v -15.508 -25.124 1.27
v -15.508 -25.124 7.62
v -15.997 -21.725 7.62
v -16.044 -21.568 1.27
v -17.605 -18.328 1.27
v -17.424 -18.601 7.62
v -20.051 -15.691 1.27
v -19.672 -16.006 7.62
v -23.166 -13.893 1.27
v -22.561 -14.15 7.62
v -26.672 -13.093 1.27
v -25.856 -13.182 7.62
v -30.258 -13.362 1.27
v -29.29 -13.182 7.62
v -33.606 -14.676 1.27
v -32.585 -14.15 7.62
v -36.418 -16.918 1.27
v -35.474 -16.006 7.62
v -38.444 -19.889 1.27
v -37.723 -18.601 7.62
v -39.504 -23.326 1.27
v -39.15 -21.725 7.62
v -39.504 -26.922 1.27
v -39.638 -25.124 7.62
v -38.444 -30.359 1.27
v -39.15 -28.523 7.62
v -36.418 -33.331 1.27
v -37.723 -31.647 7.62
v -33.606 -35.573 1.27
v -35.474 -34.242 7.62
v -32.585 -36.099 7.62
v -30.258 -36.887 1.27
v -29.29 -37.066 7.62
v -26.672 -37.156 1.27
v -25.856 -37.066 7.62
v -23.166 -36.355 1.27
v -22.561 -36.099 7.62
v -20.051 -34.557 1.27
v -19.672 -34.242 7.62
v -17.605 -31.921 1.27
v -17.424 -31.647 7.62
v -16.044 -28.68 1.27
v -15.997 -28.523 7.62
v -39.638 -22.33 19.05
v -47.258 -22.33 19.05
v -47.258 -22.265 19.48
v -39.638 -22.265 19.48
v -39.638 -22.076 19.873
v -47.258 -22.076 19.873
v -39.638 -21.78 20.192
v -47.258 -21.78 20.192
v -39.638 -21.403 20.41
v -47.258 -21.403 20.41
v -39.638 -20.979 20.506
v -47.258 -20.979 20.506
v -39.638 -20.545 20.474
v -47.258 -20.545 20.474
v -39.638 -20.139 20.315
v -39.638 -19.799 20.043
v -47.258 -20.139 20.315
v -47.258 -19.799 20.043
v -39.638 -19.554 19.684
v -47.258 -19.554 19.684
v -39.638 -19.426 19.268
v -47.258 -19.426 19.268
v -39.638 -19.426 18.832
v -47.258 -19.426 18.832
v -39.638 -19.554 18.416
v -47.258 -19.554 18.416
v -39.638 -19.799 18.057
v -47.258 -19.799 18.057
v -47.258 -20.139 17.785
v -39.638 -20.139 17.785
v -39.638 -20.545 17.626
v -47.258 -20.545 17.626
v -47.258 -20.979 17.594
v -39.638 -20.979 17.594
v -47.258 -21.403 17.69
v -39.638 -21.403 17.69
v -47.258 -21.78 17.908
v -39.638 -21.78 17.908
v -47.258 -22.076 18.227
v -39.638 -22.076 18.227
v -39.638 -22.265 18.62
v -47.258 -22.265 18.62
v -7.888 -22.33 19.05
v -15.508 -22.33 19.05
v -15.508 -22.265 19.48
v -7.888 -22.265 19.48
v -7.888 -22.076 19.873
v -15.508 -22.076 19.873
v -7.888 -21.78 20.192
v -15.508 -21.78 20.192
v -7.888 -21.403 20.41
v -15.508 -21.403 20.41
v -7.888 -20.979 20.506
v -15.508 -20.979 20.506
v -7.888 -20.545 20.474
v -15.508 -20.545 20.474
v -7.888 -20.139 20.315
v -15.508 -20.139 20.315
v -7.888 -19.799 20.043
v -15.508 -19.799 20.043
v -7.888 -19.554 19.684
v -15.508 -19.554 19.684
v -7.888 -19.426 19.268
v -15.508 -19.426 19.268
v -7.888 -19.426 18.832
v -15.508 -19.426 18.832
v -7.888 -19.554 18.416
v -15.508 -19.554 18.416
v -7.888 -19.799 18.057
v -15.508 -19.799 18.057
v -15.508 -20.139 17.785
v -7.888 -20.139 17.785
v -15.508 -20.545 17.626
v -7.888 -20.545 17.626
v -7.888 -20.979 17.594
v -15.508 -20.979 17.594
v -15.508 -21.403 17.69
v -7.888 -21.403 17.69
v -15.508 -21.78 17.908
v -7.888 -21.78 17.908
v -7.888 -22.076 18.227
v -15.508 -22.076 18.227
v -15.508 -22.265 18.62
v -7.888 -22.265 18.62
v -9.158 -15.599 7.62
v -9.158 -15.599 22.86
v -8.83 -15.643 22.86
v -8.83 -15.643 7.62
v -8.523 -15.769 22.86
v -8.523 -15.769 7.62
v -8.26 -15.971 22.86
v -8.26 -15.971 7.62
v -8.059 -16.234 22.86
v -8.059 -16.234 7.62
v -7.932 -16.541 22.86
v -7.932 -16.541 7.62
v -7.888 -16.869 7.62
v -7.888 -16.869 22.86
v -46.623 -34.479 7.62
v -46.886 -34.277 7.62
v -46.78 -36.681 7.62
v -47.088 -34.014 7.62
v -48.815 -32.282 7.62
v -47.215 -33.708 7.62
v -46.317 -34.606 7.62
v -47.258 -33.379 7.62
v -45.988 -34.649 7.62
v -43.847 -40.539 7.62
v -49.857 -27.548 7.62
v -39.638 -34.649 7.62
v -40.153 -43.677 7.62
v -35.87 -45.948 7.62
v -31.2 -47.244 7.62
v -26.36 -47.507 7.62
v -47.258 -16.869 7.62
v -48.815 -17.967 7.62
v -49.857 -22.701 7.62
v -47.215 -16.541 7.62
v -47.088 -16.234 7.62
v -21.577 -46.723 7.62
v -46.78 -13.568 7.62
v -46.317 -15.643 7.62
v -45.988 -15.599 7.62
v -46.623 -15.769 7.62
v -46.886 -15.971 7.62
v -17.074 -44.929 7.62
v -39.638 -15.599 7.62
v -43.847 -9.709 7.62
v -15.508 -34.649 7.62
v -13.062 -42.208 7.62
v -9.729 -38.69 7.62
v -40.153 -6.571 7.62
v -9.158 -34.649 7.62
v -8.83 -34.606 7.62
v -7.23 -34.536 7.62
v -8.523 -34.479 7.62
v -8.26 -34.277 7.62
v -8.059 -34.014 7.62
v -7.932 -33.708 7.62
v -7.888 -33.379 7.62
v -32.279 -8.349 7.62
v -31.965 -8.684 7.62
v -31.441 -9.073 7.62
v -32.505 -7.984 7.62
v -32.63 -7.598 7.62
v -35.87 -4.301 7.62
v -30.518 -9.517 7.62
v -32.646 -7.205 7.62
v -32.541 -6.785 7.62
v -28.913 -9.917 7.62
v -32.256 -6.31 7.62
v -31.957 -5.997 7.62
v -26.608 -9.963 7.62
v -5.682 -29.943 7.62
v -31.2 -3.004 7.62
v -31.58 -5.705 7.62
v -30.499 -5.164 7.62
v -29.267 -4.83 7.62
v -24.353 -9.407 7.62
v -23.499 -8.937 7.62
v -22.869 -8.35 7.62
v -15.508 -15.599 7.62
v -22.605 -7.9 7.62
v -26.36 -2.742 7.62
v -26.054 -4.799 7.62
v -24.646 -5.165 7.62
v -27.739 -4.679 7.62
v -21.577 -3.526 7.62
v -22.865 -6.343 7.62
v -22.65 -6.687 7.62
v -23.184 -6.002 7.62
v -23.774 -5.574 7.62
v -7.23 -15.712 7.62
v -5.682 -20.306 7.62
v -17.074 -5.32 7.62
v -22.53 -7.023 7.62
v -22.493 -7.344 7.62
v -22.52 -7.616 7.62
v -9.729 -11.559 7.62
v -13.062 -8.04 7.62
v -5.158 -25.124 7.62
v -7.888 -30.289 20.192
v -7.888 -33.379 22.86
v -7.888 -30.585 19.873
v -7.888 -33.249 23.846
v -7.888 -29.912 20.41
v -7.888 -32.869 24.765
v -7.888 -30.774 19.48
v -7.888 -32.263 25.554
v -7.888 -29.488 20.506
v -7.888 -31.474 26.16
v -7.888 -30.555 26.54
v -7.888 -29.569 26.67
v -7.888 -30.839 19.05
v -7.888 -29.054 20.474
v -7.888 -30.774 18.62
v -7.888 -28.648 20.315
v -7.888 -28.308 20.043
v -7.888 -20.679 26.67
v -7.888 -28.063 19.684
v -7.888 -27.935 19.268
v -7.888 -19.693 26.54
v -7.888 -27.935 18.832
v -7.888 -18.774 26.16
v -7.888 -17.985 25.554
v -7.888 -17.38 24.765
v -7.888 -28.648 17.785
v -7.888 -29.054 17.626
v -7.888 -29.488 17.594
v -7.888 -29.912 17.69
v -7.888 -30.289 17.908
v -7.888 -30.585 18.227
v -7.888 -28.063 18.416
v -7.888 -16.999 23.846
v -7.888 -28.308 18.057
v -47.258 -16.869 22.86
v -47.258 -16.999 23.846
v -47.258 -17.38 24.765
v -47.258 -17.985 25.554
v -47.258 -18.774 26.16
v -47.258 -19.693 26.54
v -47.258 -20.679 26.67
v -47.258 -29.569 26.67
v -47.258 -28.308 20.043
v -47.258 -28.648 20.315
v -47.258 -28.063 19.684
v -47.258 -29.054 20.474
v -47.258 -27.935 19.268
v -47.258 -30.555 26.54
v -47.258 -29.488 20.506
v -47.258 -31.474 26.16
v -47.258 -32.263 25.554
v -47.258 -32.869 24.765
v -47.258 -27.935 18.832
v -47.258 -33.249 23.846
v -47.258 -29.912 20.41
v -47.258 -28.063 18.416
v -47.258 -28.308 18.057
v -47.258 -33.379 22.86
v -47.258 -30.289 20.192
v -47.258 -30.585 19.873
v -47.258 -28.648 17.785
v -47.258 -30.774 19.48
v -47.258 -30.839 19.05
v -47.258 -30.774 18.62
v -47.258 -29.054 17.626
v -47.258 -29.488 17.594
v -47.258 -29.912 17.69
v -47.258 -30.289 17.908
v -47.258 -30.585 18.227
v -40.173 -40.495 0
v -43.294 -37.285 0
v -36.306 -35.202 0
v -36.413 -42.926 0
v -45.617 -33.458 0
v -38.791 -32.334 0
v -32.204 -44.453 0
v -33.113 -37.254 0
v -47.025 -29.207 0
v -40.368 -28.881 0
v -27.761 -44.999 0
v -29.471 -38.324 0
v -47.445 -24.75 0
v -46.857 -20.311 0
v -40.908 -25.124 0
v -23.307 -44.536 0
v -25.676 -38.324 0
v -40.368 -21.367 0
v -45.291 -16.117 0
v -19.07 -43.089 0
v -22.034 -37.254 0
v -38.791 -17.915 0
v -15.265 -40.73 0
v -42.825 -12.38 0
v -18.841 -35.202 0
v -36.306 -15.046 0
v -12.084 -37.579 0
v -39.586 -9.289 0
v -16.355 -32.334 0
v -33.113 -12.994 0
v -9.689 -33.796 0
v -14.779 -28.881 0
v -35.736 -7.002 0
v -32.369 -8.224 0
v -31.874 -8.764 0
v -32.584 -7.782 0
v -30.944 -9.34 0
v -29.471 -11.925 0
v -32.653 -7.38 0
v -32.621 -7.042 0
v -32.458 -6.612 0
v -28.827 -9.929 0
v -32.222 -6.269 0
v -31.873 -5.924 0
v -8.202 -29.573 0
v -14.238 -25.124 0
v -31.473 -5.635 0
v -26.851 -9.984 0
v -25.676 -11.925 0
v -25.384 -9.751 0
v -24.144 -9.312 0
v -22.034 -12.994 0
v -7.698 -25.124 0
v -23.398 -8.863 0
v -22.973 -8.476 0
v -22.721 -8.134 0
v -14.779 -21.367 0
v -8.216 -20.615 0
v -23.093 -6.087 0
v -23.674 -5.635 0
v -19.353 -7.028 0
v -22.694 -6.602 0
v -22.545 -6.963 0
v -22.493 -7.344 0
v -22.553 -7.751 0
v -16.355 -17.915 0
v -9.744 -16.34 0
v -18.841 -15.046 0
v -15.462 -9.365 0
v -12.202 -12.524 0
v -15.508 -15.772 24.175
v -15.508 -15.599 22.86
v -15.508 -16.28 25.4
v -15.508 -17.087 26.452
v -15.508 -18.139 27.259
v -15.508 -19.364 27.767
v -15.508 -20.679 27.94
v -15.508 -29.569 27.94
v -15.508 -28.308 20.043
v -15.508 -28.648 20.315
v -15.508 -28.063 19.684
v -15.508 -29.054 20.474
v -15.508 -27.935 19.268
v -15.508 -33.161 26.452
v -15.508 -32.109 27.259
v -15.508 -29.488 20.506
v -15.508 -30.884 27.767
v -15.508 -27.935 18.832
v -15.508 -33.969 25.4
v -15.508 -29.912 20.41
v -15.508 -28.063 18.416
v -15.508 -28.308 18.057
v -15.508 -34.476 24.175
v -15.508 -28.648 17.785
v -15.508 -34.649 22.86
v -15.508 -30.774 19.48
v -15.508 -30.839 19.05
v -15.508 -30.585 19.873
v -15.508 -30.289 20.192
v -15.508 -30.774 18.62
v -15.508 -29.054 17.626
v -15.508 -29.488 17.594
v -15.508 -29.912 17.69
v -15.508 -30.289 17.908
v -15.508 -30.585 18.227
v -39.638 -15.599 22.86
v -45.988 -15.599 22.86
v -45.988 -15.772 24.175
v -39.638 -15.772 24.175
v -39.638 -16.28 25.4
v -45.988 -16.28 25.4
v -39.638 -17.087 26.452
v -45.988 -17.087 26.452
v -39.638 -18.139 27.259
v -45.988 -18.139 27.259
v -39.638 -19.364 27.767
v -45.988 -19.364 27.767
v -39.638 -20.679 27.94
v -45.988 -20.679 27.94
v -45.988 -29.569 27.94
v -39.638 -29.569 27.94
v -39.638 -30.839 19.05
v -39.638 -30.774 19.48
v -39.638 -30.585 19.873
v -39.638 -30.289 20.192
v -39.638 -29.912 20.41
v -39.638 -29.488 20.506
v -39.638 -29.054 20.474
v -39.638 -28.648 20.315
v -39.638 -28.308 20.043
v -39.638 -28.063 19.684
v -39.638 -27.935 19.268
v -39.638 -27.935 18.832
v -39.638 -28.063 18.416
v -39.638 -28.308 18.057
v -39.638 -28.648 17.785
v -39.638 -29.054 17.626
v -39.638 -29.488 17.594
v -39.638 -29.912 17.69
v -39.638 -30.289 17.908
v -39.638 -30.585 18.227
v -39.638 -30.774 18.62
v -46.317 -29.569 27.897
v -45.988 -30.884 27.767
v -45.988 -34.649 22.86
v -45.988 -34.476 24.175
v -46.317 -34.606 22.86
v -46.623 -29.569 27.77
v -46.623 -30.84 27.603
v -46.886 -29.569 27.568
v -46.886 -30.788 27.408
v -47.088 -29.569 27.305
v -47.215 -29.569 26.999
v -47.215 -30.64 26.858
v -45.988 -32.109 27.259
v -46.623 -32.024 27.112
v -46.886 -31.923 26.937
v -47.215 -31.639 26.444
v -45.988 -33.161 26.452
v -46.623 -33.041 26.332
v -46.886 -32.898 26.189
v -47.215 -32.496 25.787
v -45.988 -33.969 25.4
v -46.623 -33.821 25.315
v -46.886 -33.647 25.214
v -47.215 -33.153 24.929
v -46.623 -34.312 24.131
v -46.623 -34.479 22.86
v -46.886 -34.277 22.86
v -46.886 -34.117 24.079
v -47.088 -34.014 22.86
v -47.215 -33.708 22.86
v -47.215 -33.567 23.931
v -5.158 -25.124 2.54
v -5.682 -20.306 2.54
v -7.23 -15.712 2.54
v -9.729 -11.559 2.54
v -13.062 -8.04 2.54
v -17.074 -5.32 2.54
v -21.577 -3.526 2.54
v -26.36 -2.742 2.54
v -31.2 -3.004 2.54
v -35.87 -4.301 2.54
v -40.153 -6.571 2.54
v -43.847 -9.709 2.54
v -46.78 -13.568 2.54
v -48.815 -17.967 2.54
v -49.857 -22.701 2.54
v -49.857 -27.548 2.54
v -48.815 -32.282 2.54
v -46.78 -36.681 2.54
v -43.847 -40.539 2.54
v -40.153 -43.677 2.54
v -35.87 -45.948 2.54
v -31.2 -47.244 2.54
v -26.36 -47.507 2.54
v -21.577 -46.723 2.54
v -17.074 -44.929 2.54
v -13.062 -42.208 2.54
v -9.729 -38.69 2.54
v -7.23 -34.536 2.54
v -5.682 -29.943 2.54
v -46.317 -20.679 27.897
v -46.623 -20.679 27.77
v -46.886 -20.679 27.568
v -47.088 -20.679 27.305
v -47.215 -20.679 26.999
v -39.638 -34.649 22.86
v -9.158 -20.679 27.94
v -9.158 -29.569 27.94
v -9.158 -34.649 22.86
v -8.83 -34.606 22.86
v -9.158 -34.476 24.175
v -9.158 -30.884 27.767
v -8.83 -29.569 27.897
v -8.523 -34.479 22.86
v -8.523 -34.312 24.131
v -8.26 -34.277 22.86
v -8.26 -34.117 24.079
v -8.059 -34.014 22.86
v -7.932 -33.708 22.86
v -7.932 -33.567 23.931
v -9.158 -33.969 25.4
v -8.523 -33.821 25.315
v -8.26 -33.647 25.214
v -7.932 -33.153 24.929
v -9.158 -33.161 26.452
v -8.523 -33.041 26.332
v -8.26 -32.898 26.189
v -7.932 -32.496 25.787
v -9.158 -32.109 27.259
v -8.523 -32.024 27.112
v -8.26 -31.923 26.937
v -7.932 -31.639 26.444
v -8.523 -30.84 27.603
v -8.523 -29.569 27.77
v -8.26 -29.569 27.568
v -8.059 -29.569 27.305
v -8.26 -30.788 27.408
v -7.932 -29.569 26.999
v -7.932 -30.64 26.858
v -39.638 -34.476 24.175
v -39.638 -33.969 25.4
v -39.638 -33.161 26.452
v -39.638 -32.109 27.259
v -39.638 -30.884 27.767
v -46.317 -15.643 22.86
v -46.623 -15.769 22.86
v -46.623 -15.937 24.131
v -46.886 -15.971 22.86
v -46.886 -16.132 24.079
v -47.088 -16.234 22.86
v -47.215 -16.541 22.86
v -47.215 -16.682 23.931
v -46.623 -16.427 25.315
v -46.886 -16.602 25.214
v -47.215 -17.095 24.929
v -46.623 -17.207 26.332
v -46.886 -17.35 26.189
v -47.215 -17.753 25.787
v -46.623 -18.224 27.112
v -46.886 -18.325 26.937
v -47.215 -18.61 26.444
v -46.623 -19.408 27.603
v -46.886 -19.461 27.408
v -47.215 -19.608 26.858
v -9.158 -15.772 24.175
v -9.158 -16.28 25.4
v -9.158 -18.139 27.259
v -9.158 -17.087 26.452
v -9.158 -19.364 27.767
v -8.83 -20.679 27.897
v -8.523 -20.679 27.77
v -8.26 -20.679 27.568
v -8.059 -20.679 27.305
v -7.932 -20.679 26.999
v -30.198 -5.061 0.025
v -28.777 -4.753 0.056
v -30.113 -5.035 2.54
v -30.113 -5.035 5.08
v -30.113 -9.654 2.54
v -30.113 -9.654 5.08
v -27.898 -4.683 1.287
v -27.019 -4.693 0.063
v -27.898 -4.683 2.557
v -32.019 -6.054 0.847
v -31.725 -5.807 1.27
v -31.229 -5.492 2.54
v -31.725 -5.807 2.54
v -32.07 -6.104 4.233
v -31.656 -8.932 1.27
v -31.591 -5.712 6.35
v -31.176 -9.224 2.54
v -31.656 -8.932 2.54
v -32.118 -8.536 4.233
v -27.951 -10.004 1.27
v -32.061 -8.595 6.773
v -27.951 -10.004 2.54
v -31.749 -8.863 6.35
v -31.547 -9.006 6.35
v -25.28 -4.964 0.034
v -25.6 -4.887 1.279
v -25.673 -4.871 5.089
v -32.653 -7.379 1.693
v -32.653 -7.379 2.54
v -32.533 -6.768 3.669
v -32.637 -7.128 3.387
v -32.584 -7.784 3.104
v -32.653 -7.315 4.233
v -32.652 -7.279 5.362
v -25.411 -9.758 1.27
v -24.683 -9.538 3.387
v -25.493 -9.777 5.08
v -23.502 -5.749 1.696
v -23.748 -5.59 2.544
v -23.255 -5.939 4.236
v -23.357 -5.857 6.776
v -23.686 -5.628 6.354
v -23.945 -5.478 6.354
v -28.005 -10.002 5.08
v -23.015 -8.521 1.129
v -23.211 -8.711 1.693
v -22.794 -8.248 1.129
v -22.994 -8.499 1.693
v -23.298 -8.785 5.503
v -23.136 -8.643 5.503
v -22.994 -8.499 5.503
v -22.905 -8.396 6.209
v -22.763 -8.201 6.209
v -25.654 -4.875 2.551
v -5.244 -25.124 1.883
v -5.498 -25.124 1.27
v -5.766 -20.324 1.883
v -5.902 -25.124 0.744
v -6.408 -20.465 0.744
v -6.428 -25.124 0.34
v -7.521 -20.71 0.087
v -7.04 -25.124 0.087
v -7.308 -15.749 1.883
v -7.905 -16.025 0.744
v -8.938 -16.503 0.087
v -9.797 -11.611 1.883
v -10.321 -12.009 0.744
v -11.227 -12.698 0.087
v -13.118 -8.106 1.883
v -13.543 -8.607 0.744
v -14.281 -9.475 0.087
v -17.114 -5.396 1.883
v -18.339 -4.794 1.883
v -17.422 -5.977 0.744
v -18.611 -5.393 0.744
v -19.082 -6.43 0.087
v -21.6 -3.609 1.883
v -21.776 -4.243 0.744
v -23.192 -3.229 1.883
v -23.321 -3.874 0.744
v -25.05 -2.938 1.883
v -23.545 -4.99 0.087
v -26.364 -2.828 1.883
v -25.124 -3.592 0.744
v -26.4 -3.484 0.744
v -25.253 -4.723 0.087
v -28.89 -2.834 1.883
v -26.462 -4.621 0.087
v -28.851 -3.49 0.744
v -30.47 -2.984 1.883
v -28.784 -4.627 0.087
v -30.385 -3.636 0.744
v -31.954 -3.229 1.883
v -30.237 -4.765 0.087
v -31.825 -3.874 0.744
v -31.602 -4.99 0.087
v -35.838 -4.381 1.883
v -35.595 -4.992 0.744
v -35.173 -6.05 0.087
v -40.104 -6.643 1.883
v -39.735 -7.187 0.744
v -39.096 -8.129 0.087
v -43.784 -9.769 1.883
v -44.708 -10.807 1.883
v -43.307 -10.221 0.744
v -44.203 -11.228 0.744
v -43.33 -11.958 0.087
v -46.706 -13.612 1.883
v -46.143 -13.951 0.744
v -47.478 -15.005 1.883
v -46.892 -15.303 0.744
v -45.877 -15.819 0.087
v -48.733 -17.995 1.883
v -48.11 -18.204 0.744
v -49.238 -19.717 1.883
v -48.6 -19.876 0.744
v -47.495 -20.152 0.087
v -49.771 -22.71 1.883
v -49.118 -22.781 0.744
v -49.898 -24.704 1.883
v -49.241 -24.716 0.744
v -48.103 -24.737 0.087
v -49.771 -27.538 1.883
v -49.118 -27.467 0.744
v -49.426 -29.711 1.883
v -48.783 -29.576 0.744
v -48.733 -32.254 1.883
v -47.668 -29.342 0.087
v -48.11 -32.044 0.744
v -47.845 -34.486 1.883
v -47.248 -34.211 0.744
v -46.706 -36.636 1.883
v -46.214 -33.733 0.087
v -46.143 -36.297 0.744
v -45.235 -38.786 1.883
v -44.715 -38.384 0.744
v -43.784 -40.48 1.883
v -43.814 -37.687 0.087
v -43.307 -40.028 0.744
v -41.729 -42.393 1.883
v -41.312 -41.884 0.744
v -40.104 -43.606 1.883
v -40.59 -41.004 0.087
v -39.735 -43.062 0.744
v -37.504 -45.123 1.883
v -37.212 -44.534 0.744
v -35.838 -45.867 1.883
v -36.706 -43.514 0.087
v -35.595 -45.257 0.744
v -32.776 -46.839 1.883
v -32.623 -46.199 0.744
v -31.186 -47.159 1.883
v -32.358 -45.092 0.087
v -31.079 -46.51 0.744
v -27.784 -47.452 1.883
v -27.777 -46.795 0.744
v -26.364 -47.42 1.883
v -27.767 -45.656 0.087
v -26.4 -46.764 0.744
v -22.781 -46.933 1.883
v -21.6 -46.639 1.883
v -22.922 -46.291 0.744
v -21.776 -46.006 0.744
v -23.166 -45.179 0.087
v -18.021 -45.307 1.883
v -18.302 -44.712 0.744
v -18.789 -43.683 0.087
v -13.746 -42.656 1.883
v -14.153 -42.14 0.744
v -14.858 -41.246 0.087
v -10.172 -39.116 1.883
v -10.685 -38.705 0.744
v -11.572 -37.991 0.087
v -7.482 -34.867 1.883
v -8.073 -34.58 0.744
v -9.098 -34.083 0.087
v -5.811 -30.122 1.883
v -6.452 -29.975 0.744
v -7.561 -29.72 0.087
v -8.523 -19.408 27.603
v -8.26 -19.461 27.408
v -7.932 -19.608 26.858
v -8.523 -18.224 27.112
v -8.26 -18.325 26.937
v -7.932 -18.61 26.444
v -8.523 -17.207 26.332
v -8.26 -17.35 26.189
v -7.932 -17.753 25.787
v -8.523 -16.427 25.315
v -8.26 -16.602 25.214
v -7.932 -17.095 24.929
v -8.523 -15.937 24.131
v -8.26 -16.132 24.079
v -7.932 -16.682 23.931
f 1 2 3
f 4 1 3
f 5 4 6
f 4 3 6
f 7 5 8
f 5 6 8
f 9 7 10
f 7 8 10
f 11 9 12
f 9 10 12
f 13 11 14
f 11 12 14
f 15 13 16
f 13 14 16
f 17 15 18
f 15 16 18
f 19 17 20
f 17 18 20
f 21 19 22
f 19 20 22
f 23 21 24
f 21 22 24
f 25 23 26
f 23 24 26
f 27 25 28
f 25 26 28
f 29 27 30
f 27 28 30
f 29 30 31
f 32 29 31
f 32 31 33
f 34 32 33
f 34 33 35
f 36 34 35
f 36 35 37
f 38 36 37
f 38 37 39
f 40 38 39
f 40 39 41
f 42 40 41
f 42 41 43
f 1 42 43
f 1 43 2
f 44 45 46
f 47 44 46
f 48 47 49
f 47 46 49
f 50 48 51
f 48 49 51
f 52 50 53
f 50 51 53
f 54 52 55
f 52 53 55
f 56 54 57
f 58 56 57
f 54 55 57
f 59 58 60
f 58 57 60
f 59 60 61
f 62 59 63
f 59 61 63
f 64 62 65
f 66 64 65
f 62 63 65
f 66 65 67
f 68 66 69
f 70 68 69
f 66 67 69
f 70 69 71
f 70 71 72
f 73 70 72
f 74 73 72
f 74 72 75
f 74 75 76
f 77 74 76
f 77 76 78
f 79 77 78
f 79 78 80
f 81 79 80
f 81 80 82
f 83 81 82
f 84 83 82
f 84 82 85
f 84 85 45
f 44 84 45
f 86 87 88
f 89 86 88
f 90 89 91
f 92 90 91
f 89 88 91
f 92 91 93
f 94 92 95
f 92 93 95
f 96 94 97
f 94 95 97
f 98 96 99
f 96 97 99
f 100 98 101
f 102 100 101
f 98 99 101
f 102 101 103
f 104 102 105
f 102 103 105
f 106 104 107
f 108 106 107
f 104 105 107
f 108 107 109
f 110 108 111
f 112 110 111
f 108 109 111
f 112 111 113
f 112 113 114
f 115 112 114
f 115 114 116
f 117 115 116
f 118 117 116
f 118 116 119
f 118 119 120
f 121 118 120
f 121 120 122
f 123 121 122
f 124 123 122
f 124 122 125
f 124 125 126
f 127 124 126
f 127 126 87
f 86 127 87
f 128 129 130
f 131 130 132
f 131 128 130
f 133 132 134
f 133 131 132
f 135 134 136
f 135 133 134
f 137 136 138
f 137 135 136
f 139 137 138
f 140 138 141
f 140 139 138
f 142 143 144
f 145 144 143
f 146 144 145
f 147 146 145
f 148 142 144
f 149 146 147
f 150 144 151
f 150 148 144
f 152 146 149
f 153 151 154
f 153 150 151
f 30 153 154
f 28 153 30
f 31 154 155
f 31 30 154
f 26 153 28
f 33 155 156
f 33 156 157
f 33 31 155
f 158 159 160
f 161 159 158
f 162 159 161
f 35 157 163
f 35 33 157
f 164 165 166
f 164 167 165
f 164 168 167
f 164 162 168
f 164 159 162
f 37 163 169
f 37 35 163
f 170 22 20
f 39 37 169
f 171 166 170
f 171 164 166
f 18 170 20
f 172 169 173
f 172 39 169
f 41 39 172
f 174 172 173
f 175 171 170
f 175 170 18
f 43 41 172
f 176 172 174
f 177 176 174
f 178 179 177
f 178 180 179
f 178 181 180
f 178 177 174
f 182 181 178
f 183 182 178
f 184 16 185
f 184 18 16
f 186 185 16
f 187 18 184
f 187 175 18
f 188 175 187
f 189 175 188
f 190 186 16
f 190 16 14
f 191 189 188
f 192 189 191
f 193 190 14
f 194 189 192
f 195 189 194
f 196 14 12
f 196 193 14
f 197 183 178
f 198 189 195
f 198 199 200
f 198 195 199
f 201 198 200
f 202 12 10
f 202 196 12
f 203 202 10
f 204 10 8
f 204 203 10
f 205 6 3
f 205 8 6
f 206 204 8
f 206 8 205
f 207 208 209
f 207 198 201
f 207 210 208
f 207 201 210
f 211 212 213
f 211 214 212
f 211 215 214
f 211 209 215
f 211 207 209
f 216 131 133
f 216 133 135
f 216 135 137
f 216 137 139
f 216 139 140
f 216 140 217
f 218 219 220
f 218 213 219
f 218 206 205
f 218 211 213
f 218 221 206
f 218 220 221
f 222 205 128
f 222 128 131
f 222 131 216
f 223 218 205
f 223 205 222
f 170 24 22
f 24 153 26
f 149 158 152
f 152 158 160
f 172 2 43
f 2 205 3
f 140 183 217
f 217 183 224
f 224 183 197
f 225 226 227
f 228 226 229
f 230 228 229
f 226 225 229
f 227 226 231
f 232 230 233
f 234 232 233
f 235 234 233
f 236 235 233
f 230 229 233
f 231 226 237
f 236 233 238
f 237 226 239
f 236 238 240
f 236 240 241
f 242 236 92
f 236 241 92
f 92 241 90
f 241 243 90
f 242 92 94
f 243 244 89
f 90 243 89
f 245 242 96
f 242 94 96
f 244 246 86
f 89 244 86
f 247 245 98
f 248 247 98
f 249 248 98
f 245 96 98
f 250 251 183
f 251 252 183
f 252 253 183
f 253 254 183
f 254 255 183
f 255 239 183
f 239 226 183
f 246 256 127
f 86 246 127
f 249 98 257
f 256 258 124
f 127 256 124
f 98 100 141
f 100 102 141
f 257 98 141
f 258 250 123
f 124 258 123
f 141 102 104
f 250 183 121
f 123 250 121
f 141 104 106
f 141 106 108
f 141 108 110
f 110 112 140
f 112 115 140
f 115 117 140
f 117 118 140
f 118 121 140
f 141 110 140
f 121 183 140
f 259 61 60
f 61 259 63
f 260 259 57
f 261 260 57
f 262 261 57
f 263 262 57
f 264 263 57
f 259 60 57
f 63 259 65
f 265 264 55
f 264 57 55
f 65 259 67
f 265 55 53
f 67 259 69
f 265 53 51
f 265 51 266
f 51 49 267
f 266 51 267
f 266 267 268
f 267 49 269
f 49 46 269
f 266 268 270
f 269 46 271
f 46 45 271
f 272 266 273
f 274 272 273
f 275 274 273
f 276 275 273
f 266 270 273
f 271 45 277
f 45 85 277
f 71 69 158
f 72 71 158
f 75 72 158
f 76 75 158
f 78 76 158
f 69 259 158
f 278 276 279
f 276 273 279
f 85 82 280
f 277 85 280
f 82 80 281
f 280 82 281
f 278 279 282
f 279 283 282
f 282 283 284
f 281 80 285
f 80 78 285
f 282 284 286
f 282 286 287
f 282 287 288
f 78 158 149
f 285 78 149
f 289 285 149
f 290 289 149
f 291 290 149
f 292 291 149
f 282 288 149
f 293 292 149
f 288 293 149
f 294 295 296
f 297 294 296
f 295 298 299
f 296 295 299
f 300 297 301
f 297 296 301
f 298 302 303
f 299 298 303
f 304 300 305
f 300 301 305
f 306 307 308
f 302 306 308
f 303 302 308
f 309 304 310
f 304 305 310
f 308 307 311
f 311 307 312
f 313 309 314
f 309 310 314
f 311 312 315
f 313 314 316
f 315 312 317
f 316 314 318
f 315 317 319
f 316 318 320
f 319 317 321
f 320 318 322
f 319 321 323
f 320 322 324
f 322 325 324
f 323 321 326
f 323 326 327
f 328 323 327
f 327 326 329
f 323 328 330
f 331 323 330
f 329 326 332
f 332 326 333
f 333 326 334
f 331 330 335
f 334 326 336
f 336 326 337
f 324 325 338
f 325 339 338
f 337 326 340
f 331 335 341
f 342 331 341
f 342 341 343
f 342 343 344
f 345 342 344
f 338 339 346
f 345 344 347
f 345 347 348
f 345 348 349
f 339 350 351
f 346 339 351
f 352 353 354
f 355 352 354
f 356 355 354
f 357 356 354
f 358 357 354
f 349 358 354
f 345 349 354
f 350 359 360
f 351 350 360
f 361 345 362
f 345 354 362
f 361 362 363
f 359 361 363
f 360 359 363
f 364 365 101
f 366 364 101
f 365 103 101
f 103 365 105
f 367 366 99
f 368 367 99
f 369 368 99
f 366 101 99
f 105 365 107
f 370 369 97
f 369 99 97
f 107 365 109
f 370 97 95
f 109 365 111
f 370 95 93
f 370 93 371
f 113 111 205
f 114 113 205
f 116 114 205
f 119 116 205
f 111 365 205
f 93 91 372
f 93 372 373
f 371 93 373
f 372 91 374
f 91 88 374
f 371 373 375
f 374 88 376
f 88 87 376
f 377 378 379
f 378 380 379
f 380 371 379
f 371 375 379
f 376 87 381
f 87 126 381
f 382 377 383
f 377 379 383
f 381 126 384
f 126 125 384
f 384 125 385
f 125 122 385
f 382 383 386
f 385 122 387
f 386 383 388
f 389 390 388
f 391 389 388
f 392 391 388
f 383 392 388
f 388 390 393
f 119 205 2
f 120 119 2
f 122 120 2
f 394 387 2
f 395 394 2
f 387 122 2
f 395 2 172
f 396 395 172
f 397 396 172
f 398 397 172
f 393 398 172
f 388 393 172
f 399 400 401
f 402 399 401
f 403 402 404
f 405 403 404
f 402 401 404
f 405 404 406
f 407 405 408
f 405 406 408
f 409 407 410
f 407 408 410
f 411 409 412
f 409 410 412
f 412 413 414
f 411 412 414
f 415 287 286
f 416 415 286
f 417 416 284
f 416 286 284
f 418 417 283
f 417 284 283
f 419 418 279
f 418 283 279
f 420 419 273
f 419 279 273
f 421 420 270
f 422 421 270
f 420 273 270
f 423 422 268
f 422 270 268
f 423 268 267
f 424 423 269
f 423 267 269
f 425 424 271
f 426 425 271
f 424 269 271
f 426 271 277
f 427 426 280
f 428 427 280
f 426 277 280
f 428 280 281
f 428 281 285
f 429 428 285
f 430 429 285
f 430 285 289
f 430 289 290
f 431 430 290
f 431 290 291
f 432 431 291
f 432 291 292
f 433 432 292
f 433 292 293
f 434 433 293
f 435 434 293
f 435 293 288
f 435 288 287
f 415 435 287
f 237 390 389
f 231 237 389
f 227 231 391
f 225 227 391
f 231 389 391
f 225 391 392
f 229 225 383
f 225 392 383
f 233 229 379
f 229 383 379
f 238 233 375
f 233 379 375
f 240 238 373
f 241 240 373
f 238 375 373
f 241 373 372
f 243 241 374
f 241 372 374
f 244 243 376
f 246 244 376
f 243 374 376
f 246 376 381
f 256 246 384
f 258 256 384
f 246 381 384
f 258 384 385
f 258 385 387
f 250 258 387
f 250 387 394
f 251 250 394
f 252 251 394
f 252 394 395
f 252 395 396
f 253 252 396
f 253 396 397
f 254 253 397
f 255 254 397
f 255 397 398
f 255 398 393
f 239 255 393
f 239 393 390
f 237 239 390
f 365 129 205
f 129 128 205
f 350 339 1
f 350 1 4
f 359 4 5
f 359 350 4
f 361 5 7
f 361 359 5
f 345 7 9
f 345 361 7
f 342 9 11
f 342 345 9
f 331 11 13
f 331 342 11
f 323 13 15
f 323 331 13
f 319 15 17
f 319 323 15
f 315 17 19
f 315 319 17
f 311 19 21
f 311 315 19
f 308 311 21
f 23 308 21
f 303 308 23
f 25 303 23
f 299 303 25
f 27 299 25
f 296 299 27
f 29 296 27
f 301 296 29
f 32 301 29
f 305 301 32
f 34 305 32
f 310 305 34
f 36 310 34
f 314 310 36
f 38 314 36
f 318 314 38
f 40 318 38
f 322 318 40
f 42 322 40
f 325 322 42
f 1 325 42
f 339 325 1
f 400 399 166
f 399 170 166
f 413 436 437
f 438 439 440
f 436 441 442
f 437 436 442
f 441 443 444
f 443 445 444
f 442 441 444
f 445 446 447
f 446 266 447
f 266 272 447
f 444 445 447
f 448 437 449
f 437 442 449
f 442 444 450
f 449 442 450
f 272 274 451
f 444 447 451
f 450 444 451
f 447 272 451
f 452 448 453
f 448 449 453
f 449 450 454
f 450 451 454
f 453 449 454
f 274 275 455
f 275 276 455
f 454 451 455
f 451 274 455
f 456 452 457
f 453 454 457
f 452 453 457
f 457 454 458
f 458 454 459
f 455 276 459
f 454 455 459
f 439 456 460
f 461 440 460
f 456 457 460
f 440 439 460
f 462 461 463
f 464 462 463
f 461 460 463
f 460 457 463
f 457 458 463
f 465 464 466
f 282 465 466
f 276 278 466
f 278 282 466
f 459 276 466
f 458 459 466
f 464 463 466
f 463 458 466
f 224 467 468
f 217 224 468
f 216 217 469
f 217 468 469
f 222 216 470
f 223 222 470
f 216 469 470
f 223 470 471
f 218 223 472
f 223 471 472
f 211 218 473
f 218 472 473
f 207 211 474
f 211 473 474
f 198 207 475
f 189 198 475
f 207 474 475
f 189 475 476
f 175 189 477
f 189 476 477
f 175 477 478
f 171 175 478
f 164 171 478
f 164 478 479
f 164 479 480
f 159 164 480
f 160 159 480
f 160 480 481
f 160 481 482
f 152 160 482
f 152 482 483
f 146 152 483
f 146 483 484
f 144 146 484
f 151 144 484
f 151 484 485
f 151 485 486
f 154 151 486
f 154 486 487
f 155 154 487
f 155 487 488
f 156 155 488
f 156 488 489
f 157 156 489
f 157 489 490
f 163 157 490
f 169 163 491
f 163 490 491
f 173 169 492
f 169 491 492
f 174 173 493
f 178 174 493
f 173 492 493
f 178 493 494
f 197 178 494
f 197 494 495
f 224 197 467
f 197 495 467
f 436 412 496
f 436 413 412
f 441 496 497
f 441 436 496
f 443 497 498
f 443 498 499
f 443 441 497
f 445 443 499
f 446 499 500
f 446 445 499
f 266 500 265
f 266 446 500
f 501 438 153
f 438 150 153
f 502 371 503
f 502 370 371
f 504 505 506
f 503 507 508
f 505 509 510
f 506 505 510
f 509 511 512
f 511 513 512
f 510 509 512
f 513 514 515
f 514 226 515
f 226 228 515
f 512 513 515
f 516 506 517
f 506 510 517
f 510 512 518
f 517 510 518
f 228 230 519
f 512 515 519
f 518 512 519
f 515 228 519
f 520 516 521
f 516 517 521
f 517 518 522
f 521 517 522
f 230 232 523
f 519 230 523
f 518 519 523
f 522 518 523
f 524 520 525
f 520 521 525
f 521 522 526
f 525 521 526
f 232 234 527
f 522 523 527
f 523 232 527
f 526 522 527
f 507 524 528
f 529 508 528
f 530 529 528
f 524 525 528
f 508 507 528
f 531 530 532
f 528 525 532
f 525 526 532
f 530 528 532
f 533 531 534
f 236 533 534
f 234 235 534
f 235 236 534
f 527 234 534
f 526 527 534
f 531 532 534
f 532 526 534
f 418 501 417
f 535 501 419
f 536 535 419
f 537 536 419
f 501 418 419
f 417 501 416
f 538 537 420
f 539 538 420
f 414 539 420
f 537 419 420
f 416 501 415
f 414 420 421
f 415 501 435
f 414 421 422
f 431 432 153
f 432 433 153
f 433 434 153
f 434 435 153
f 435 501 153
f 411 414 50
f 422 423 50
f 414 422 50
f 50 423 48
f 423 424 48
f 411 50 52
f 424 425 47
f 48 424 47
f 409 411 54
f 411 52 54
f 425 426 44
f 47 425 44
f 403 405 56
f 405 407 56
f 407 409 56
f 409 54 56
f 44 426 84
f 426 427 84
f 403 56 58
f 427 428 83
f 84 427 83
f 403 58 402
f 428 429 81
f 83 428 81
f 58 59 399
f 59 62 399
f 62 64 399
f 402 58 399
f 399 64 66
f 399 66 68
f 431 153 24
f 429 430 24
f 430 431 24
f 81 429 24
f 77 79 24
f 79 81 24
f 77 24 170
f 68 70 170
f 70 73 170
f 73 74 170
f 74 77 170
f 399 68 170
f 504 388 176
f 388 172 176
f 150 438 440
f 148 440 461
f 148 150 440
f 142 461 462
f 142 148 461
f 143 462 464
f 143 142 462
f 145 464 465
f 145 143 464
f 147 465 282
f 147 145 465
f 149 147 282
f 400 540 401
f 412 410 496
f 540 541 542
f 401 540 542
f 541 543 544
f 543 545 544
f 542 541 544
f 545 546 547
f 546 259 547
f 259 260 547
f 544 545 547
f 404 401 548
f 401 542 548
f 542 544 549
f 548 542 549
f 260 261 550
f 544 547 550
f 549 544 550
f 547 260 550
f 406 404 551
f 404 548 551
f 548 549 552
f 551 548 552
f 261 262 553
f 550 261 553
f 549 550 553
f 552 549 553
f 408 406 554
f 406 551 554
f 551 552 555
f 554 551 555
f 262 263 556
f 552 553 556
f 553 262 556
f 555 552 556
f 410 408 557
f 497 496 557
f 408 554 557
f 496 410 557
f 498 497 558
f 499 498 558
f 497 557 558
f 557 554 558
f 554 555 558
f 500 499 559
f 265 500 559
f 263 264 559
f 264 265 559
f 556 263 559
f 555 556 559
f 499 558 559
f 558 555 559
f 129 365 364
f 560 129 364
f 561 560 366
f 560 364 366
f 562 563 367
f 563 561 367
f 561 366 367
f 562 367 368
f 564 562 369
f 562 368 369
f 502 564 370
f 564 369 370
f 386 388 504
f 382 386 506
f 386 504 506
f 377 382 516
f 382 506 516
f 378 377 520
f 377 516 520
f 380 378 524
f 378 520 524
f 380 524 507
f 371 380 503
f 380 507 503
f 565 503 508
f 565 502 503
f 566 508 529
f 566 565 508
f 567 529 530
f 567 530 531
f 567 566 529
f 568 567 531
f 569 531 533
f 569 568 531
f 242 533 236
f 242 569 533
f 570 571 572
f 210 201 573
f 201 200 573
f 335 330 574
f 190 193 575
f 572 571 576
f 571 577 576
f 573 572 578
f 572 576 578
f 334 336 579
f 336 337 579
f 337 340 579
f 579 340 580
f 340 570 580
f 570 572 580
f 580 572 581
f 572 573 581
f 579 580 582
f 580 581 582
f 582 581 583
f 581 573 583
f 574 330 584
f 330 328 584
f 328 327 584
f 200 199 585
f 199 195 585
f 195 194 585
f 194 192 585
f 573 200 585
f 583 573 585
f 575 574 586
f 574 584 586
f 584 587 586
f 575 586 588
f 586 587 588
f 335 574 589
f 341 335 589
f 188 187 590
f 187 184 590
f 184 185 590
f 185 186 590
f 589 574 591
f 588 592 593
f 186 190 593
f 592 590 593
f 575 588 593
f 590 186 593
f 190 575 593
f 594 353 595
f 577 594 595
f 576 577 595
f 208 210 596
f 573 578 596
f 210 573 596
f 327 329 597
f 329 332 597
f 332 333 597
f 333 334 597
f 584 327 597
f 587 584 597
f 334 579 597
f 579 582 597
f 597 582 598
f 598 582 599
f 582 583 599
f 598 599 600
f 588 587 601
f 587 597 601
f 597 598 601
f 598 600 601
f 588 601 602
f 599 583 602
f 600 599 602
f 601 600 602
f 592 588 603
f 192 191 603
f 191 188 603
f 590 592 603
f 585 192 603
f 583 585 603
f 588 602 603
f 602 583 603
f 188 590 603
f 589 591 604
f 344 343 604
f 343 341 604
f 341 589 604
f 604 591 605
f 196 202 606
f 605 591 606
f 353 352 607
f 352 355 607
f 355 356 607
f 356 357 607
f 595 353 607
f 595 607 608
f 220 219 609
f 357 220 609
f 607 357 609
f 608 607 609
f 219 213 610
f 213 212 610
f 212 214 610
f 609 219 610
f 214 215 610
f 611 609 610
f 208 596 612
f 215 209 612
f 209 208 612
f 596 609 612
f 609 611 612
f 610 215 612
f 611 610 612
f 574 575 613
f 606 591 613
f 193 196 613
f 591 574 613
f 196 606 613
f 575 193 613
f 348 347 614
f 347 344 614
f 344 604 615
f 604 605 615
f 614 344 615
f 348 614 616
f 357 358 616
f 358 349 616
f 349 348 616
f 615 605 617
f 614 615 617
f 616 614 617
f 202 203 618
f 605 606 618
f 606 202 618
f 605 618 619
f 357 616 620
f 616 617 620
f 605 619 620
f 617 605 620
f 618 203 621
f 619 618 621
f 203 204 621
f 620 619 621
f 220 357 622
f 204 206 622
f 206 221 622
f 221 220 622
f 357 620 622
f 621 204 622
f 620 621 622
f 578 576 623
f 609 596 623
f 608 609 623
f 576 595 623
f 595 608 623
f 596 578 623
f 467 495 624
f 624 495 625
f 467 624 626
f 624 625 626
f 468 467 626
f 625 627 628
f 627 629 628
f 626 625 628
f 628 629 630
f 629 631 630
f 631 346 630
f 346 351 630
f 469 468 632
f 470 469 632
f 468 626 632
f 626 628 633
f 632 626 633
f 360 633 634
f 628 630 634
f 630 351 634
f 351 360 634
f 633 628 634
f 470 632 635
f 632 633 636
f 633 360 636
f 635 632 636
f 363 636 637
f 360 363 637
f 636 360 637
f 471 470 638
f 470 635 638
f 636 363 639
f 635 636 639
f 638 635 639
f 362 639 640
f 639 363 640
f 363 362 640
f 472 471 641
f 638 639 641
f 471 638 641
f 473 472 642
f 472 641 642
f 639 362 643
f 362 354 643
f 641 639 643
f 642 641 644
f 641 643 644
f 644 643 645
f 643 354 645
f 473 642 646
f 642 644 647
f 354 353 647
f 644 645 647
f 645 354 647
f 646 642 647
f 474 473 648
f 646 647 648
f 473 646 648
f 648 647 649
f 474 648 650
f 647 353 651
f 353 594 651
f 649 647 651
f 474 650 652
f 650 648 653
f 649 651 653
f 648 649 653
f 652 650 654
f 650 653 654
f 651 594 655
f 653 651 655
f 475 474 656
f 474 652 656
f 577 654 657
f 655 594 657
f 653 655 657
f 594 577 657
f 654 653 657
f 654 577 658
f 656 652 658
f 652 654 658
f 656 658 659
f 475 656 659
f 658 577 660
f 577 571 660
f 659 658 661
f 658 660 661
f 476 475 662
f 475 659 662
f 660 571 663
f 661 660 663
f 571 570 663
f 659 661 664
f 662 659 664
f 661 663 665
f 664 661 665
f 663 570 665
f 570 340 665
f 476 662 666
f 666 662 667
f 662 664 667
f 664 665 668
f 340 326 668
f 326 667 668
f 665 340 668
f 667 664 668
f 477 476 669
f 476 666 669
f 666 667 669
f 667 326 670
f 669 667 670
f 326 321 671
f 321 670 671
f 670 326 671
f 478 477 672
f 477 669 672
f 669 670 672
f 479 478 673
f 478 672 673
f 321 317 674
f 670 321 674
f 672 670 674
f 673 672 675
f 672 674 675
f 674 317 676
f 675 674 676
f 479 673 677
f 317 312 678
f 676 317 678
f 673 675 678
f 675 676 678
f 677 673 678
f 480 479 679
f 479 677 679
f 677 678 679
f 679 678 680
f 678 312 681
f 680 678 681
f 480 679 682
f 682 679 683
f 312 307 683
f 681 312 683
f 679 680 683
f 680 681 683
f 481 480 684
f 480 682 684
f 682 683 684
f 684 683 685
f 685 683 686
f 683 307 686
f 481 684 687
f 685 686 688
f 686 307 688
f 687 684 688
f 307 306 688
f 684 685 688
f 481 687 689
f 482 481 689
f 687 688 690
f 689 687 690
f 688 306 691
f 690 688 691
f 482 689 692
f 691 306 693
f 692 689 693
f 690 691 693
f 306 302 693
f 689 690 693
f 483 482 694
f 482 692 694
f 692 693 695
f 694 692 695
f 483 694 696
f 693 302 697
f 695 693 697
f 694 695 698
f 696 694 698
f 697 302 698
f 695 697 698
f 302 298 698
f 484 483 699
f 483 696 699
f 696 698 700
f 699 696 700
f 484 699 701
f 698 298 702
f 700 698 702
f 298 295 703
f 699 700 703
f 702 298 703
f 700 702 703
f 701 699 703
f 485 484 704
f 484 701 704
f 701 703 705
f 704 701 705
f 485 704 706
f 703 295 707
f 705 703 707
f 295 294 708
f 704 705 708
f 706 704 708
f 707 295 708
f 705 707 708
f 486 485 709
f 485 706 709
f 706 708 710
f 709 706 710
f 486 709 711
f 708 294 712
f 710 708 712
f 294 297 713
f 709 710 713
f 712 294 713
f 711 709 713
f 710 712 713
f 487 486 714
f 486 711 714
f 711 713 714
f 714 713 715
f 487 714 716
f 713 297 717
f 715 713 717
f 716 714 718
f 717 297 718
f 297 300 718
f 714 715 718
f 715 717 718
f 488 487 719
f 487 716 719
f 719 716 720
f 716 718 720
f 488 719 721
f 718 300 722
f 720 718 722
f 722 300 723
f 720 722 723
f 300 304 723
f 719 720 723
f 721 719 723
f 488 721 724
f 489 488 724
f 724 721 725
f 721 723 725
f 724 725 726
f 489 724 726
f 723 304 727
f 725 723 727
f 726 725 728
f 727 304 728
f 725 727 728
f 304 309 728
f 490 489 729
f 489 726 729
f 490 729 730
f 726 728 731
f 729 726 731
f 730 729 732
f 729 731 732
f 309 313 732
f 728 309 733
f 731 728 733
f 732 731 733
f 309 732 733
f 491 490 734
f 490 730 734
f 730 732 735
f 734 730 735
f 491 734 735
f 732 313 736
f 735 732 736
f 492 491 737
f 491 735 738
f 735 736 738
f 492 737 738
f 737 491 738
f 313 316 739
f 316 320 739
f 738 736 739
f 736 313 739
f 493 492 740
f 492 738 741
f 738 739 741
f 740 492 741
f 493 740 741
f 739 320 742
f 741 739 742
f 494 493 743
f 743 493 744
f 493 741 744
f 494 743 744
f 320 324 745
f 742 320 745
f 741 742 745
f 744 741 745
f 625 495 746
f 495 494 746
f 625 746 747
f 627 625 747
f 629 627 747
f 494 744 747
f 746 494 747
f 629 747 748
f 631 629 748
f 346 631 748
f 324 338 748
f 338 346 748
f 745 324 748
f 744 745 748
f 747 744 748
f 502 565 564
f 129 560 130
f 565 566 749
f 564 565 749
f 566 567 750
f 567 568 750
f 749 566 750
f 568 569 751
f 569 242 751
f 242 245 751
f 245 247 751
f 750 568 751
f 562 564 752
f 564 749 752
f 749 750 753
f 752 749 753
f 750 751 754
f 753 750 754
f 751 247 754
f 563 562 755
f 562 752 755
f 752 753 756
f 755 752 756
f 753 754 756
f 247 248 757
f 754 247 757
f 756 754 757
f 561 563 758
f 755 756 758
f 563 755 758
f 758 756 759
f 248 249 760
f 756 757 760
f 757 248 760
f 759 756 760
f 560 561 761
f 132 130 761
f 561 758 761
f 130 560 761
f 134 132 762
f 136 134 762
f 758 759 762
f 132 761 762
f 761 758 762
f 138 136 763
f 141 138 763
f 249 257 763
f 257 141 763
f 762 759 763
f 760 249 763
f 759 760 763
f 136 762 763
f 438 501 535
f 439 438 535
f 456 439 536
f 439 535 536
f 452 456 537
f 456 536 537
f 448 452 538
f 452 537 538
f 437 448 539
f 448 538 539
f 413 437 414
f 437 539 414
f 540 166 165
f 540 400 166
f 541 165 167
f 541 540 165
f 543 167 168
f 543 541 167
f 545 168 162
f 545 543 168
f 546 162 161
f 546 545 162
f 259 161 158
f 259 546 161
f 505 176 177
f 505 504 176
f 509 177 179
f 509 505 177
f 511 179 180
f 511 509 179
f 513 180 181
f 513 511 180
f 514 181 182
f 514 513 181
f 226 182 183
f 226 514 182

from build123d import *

# Parameters (mm, degrees)
F0_R     = 22.4155
F1_DEPTH = 7.62
F2_R     = 12.065
F3_DEPTH = 25.4
F5_DEPTH = 20.32
F6_R     = 5.08
F7_R     = 1.27
F8_R     = 1.4605
F9_DEPTH = 76.2
F11_SIZE = 1.27


# Not quite as in the source:
# - a fillet or chamfer that OpenCascade refuses, or shapes differently, is made with other operations: its cross-section is extruded or revolved along the edge and cut away or added


with BuildPart() as f1:
    # F0 (on Top) → F1 (new body)
    with BuildSketch(Plane.XY):
        with Locations((-27.5733582675, -25.1242369413)):
            Circle(F0_R)
    extrude(amount=F1_DEPTH)

    # F2 (on face) → F3 (cut)
    with BuildSketch(Plane.XY.offset(7.62)):
        with BuildLine():
            add(Edge.make_bspline(
                [(-22.4933582675, -7.3442369413), (-22.4933582675, -2.7248574376), (-30.1133582675, -5.0345471894), (-37.7333582675, -7.3442369413), (-30.1133582675, -9.6539266932), (-22.4933582675, -11.9636164451), (-22.4933582675, -7.3442369413)],
                knots=[0, 0, 0, 2.0943951024, 2.0943951024, 4.1887902048, 4.1887902048, 6.2831853072, 6.2831853072, 6.2831853072], degree=2, weights=[1, 0.5, 1, 0.5, 1, 0.5, 1]))
        make_face()
        with Locations((-27.5733582675, -25.1242369413)):
            Circle(F2_R)
    extrude(amount=-F3_DEPTH, mode=Mode.SUBTRACT)

    # F4 (on face) → F5 (join)
    with BuildSketch(Plane.XY.offset(7.62)):
        Polygon((-39.6383582675, -34.6492369413), (-39.6383582675, -25.1242369413), (-39.6383582675, -15.5992369413), (-47.2583582675, -15.5992369413), (-47.2583582675, -34.6492369413), align=None)
        Polygon((-7.8883582675, -34.6492369413), (-7.8883582675, -15.5992369413), (-15.5083582675, -15.5992369413), (-15.5083582675, -25.1242369413), (-15.5083582675, -34.6492369413), align=None)
    extrude(amount=F5_DEPTH)

    # F6
    f6_edges = [f1.edges().sort_by_distance(p)[0] for p in [
        (-11.698358, -34.649237, 27.94),
        (-11.698358, -15.599237, 27.94),
        (-43.448358, -34.649237, 27.94),
        (-43.448358, -15.599237, 27.94),
    ]]
    fillet(f6_edges, radius=F6_R)

    # F7
    f7_edges = [f1.edges().sort_by_distance(p)[0] for p in [
        (-7.888358, -34.649237, 15.24),
        (-47.258358, -15.599237, 15.24),
        (-47.258358, -34.649237, 15.24),
        (-47.258358, -33.161339, 26.452102),
        (-47.258358, -25.124237, 27.94),
        (-47.258358, -17.087134, 26.452102),
        (-7.888358, -33.161339, 26.452102),
        (-7.888358, -25.124237, 27.94),
        (-7.888358, -15.599237, 15.24),
        (-7.888358, -17.087134, 26.452102),
    ]]
    fillet(f7_edges, radius=F7_R)

    # F8 (on face) → F9 (cut)
    with BuildSketch(Plane(origin=(-47.2583582675, 0, 0), x_dir=(0, -1, 0), z_dir=(-1, 0, 0))):
        with Locations((20.8697369413, 19.05)):
            Circle(F8_R)
        with Locations((29.3787369413, 19.05)):
            Circle(F8_R)
    extrude(amount=-F9_DEPTH, mode=Mode.SUBTRACT)

    # F10: fillet of radius 2.54 on 1 edges, made by hand

    # F10_s1 → F10_t2 (revolve, cut)
    with BuildSketch(Plane.XZ.offset(25.1242369413)):
        with BuildLine():
            ThreePointArc((-5.1578582675, 2.54), (-5.9018070433, 0.7439487758), (-7.6978582675, 0))
            Line((-7.6978582675, 0), (-7.6978582675, -0.0508))
            Line((-7.6978582675, -0.0508), (-5.1070582675, -0.0508))
            Line((-5.1070582675, -0.0508), (-5.1070582675, 2.54))
            Line((-5.1070582675, 2.54), (-5.1578582675, 2.54))
        make_face()
    revolve(axis=Axis((-27.5733582675, -25.1242369413, 0), (0, 0, 1)), mode=Mode.SUBTRACT)

    # F11
    f11_edges = [f1.edges().sort_by_distance(p)[0] for p in [
        (-39.638358, -25.124237, 0),
    ]]
    chamfer(f11_edges, length=F11_SIZE)


solid = f1.part
